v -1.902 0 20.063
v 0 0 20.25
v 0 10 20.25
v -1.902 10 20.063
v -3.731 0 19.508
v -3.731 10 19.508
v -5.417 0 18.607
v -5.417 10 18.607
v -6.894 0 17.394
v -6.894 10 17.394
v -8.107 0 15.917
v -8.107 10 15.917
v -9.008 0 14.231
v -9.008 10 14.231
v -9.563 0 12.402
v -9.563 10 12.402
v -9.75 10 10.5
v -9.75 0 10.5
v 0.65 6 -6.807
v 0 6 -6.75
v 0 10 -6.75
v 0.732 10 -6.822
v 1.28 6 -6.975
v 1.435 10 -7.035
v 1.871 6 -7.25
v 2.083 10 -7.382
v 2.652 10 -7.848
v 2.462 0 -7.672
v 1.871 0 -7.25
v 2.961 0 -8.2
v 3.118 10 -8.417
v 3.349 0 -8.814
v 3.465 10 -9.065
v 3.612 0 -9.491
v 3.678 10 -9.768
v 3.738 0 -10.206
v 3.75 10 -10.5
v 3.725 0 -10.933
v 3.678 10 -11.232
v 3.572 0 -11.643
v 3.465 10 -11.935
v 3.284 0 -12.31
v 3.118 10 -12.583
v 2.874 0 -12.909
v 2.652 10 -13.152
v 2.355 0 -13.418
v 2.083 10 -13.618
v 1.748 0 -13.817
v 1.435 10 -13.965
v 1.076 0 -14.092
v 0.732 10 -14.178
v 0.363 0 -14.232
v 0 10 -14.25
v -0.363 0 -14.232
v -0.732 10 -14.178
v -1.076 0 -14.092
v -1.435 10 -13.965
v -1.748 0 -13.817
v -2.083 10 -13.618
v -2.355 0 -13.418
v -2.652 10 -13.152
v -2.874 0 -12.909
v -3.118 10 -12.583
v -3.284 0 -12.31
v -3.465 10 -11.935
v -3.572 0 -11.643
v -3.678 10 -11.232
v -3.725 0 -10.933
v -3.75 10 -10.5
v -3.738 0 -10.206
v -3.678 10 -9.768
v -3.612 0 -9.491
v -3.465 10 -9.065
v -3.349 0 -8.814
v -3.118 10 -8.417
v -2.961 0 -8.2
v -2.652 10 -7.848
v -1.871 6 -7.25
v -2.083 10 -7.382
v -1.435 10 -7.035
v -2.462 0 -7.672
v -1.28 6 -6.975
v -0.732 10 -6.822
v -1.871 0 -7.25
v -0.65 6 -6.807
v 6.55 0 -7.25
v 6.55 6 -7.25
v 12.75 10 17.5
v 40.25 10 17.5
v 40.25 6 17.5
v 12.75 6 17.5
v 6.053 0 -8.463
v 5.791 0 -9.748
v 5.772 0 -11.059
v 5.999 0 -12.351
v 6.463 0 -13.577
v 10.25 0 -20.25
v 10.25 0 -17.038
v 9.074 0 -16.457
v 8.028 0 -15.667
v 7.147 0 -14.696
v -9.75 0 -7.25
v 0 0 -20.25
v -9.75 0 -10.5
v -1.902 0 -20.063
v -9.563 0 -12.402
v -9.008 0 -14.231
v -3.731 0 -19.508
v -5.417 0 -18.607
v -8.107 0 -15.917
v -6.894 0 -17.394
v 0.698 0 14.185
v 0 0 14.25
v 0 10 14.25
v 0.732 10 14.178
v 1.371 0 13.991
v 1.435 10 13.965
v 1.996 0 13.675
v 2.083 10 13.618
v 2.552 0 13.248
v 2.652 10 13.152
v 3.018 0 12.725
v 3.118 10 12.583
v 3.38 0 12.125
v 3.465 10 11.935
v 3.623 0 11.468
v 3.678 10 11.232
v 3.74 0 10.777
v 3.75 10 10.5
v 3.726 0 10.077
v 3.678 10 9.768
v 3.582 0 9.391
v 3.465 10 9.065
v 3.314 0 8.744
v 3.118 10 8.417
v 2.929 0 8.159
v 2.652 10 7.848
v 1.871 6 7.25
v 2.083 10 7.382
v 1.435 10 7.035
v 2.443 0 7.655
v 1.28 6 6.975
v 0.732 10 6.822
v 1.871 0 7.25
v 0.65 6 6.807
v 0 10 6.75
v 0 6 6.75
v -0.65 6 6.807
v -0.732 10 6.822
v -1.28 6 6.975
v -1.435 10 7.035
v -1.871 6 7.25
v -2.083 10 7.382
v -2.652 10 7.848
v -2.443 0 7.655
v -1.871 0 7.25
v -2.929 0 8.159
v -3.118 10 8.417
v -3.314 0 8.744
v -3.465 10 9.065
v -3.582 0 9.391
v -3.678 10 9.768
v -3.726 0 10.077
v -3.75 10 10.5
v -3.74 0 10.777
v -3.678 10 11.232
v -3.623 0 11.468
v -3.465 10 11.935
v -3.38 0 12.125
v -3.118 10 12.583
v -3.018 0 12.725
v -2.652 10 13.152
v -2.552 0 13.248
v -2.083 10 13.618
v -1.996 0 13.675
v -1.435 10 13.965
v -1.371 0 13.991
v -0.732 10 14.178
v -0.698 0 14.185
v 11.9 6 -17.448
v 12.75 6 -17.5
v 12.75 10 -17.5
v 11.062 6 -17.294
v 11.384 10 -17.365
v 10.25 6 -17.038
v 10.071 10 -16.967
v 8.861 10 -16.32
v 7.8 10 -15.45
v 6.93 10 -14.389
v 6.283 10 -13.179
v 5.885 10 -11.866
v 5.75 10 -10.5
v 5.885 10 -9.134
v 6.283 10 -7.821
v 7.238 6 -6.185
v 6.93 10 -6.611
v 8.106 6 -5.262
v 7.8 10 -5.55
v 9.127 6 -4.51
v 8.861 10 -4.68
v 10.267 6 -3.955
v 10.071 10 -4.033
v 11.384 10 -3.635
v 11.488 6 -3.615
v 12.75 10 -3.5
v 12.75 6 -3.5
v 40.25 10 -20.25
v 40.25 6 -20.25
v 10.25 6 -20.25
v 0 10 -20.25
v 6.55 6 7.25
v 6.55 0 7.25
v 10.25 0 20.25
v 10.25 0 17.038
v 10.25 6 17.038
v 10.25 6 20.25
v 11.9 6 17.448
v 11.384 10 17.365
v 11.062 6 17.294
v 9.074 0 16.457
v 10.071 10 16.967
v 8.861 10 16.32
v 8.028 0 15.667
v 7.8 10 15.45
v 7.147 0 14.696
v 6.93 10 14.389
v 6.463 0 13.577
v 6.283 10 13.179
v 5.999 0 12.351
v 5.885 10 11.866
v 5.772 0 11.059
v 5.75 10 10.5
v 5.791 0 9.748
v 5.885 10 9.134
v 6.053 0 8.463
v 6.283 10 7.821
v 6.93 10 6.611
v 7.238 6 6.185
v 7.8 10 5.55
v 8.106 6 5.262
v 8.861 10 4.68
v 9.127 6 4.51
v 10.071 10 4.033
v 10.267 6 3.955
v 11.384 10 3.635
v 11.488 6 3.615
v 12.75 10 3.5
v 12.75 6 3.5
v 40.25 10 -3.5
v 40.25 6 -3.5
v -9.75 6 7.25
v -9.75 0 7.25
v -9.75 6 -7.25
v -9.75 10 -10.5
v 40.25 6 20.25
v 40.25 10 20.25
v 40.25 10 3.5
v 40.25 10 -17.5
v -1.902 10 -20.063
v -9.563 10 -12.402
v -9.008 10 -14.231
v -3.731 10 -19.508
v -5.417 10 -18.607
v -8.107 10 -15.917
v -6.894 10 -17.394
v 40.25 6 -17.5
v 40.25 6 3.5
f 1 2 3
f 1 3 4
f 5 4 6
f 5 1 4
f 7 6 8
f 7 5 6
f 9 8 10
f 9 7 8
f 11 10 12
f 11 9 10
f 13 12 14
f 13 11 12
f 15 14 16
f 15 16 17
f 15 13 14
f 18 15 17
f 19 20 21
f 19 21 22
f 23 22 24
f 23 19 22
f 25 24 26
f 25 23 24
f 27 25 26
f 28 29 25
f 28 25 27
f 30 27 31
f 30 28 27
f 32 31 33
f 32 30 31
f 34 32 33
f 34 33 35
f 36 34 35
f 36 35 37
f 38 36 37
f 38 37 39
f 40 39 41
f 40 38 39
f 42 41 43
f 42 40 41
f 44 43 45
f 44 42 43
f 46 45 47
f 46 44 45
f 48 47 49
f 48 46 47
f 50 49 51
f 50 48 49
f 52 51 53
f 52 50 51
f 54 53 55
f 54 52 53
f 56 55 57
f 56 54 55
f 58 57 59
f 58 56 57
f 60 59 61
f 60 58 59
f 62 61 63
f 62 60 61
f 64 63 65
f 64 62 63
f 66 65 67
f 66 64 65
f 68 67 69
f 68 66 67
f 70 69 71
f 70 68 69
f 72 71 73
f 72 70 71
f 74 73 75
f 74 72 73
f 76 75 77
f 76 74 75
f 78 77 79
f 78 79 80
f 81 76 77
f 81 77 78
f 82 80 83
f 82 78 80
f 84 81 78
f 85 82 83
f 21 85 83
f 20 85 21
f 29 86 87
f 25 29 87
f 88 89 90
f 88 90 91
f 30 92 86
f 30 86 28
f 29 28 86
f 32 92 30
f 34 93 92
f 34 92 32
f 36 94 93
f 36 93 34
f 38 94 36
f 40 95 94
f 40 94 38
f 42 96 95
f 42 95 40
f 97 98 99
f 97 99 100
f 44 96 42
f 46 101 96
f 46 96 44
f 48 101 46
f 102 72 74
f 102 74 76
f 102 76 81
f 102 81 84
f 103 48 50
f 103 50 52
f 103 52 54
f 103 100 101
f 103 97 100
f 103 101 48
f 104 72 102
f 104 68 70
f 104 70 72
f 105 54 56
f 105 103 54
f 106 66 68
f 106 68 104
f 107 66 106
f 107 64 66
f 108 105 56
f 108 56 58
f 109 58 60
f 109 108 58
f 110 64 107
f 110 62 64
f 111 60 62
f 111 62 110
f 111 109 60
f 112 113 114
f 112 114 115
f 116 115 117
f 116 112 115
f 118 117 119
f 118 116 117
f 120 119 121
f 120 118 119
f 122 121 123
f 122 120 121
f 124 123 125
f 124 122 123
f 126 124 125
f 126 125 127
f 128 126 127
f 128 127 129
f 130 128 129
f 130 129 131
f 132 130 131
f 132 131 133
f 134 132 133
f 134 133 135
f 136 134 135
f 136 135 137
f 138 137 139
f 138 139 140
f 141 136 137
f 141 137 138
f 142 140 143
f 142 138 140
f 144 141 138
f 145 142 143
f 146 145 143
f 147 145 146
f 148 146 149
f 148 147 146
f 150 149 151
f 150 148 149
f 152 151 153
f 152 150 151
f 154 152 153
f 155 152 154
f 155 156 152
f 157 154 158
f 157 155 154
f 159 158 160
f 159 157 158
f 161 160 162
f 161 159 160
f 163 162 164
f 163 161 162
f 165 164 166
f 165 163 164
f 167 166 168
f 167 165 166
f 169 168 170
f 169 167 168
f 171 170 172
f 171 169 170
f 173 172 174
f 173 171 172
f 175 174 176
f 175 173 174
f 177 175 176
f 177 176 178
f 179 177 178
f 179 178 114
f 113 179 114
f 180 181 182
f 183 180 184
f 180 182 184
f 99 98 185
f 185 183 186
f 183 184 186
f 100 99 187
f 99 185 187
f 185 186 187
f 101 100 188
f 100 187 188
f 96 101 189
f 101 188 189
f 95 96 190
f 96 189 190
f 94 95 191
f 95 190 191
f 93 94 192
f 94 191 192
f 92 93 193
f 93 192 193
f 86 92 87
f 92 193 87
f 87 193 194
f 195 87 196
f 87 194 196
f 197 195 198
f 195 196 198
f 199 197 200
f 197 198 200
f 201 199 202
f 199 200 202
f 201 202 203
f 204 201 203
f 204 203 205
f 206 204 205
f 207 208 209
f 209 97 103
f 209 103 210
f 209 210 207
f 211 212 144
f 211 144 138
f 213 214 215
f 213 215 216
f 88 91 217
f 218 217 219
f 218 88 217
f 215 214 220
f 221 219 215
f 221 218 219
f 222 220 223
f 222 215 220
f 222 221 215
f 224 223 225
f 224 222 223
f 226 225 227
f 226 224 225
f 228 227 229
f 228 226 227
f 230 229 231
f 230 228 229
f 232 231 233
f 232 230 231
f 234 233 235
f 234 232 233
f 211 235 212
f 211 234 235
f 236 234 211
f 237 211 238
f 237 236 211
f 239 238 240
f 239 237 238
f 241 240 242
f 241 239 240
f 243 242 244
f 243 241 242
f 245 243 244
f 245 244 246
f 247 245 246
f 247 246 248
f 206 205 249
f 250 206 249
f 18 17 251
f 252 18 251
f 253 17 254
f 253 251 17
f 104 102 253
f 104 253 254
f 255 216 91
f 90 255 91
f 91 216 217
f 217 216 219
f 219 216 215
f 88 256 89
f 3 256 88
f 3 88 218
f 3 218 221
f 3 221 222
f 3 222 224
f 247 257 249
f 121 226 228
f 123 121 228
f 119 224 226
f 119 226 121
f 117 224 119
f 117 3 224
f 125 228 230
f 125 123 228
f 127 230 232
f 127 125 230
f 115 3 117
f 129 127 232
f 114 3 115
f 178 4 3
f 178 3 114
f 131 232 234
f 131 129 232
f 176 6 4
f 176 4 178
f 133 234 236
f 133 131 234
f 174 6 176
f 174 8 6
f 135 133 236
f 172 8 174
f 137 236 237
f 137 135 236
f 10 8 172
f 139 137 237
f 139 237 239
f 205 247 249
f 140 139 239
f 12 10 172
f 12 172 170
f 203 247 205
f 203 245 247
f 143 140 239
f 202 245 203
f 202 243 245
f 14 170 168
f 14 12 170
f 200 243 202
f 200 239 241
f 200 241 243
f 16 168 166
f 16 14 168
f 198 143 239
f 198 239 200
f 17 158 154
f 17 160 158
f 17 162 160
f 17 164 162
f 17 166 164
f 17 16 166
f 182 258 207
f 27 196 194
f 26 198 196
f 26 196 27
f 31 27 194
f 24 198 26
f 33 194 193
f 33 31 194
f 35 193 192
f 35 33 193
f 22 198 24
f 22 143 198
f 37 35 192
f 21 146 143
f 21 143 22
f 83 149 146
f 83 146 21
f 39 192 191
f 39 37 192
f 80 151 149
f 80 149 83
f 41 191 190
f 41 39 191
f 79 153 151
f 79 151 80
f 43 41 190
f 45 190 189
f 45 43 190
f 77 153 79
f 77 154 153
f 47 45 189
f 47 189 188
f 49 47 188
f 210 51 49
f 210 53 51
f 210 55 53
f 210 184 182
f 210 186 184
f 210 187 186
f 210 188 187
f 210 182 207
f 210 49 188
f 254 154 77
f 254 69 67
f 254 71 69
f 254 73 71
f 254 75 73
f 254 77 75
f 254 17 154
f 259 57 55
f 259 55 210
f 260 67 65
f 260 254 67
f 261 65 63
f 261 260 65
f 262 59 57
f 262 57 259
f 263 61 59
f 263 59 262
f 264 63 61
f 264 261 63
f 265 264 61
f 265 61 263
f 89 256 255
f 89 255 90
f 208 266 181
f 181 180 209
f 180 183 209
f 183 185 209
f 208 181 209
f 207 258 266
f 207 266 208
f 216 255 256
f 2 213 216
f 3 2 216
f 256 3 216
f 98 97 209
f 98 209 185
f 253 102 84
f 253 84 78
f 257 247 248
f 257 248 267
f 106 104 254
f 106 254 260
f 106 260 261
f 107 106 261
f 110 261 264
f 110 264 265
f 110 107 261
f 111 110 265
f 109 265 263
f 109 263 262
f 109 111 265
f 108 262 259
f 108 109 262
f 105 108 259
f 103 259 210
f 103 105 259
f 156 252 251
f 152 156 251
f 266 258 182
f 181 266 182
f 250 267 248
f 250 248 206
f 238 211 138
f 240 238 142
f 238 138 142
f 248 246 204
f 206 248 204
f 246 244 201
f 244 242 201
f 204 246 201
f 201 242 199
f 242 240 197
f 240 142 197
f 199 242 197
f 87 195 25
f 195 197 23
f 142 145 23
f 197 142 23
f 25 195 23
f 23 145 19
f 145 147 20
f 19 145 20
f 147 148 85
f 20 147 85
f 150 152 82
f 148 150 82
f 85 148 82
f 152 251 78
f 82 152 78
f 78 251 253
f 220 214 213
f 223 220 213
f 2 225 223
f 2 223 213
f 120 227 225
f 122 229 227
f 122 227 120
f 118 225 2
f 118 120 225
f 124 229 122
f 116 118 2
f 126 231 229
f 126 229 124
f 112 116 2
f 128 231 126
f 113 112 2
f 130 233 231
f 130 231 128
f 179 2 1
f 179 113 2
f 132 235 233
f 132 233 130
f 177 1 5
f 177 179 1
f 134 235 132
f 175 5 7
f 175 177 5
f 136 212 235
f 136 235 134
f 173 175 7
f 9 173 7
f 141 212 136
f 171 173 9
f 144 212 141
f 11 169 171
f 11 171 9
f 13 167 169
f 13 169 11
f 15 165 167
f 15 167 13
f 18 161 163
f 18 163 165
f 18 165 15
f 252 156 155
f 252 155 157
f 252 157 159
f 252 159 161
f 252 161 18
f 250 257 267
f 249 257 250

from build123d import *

# Parameters (mm, degrees)
CROQUIS1_R              = 3.75
SALIENTE_EXTRUIR1_DEPTH = 10
CROQUIS2_W              = 40.5
CROQUIS2_H              = 4
SALIENTE_EXTRUIR2_DEPTH = 30
CROQUIS3_W              = 14.5
CROQUIS3_H              = 6
CORTAR_EXTRUIR1_DEPTH   = 38.550798926
CORTAR_EXTRUIR2_DEPTH   = 47.15327724


with BuildPart() as part:
    # Croquis1 → Saliente-Extruir1 (new body)
    with BuildSketch(Plane(origin=(0, 0, 0), x_dir=(1, 0, 0), z_dir=(0, 1, 0))):
        with BuildLine():
            Line((-9.75, -10.5), (-9.75, 10.5))
            ThreePointArc((-9.75, 10.5), (-6.894291117, 17.394291117), (0, 20.25))
            Line((0, 20.25), (10.25, 20.25))
            Line((10.25, 20.25), (10.25, -20.25))
            Line((10.25, -20.25), (0, -20.25))
            ThreePointArc((0, -20.25), (-6.894291117, -17.394291117), (-9.75, -10.5))
        make_face()
        with Locations(Location((0, 10.5, 0), (0, 0, 270))):
            Circle(CROQUIS1_R, mode=Mode.SUBTRACT)
        with Locations(Location((0, -10.5, 0), (0, 0, 270))):
            Circle(CROQUIS1_R, mode=Mode.SUBTRACT)
    extrude(amount=SALIENTE_EXTRUIR1_DEPTH)

    # Croquis2 → Saliente-Extruir2 (add)
    with BuildSketch(Plane(origin=(10.25, 0, 0), x_dir=(0, 0, -1), z_dir=(1, 0, 0))):
        with Locations((0, 8)):
            Rectangle(CROQUIS2_W, CROQUIS2_H)
    extrude(amount=SALIENTE_EXTRUIR2_DEPTH)

    # Croquis3 → Cortar-Extruir1 (cut, through all)
    with BuildSketch(Plane(origin=(10.25, 0, 0), x_dir=(0, 0, -1), z_dir=(1, 0, 0))):
        with Locations((0, 3)):
            Rectangle(CROQUIS3_W, CROQUIS3_H)
    extrude(amount=-CORTAR_EXTRUIR1_DEPTH, mode=Mode.SUBTRACT)

    # Croquis5 → Cortar-Extruir2 (cut, through all)
    with BuildSketch(Plane(origin=(0, 10, 0), x_dir=(1, 0, 0), z_dir=(0, 1, 0))):
        with BuildLine():
            Line((12.75, -3.5), (40.25, -3.5))
            ThreePointArc((40.25, -3.5), (47.25, -10.5), (40.25, -17.5))
            Line((40.25, -17.5), (12.75, -17.5))
            ThreePointArc((12.75, -17.5), (5.75, -10.5), (12.75, -3.5))
        make_face()
        with BuildLine():
            Line((12.75, 3.5), (40.25, 3.5))
            ThreePointArc((40.25, 3.5), (47.25, 10.5), (40.25, 17.5))
            Line((40.25, 17.5), (12.75, 17.5))
            ThreePointArc((12.75, 17.5), (5.75, 10.5), (12.75, 3.5))
        make_face()
    extrude(amount=-CORTAR_EXTRUIR2_DEPTH, mode=Mode.SUBTRACT)


solid = part.part
